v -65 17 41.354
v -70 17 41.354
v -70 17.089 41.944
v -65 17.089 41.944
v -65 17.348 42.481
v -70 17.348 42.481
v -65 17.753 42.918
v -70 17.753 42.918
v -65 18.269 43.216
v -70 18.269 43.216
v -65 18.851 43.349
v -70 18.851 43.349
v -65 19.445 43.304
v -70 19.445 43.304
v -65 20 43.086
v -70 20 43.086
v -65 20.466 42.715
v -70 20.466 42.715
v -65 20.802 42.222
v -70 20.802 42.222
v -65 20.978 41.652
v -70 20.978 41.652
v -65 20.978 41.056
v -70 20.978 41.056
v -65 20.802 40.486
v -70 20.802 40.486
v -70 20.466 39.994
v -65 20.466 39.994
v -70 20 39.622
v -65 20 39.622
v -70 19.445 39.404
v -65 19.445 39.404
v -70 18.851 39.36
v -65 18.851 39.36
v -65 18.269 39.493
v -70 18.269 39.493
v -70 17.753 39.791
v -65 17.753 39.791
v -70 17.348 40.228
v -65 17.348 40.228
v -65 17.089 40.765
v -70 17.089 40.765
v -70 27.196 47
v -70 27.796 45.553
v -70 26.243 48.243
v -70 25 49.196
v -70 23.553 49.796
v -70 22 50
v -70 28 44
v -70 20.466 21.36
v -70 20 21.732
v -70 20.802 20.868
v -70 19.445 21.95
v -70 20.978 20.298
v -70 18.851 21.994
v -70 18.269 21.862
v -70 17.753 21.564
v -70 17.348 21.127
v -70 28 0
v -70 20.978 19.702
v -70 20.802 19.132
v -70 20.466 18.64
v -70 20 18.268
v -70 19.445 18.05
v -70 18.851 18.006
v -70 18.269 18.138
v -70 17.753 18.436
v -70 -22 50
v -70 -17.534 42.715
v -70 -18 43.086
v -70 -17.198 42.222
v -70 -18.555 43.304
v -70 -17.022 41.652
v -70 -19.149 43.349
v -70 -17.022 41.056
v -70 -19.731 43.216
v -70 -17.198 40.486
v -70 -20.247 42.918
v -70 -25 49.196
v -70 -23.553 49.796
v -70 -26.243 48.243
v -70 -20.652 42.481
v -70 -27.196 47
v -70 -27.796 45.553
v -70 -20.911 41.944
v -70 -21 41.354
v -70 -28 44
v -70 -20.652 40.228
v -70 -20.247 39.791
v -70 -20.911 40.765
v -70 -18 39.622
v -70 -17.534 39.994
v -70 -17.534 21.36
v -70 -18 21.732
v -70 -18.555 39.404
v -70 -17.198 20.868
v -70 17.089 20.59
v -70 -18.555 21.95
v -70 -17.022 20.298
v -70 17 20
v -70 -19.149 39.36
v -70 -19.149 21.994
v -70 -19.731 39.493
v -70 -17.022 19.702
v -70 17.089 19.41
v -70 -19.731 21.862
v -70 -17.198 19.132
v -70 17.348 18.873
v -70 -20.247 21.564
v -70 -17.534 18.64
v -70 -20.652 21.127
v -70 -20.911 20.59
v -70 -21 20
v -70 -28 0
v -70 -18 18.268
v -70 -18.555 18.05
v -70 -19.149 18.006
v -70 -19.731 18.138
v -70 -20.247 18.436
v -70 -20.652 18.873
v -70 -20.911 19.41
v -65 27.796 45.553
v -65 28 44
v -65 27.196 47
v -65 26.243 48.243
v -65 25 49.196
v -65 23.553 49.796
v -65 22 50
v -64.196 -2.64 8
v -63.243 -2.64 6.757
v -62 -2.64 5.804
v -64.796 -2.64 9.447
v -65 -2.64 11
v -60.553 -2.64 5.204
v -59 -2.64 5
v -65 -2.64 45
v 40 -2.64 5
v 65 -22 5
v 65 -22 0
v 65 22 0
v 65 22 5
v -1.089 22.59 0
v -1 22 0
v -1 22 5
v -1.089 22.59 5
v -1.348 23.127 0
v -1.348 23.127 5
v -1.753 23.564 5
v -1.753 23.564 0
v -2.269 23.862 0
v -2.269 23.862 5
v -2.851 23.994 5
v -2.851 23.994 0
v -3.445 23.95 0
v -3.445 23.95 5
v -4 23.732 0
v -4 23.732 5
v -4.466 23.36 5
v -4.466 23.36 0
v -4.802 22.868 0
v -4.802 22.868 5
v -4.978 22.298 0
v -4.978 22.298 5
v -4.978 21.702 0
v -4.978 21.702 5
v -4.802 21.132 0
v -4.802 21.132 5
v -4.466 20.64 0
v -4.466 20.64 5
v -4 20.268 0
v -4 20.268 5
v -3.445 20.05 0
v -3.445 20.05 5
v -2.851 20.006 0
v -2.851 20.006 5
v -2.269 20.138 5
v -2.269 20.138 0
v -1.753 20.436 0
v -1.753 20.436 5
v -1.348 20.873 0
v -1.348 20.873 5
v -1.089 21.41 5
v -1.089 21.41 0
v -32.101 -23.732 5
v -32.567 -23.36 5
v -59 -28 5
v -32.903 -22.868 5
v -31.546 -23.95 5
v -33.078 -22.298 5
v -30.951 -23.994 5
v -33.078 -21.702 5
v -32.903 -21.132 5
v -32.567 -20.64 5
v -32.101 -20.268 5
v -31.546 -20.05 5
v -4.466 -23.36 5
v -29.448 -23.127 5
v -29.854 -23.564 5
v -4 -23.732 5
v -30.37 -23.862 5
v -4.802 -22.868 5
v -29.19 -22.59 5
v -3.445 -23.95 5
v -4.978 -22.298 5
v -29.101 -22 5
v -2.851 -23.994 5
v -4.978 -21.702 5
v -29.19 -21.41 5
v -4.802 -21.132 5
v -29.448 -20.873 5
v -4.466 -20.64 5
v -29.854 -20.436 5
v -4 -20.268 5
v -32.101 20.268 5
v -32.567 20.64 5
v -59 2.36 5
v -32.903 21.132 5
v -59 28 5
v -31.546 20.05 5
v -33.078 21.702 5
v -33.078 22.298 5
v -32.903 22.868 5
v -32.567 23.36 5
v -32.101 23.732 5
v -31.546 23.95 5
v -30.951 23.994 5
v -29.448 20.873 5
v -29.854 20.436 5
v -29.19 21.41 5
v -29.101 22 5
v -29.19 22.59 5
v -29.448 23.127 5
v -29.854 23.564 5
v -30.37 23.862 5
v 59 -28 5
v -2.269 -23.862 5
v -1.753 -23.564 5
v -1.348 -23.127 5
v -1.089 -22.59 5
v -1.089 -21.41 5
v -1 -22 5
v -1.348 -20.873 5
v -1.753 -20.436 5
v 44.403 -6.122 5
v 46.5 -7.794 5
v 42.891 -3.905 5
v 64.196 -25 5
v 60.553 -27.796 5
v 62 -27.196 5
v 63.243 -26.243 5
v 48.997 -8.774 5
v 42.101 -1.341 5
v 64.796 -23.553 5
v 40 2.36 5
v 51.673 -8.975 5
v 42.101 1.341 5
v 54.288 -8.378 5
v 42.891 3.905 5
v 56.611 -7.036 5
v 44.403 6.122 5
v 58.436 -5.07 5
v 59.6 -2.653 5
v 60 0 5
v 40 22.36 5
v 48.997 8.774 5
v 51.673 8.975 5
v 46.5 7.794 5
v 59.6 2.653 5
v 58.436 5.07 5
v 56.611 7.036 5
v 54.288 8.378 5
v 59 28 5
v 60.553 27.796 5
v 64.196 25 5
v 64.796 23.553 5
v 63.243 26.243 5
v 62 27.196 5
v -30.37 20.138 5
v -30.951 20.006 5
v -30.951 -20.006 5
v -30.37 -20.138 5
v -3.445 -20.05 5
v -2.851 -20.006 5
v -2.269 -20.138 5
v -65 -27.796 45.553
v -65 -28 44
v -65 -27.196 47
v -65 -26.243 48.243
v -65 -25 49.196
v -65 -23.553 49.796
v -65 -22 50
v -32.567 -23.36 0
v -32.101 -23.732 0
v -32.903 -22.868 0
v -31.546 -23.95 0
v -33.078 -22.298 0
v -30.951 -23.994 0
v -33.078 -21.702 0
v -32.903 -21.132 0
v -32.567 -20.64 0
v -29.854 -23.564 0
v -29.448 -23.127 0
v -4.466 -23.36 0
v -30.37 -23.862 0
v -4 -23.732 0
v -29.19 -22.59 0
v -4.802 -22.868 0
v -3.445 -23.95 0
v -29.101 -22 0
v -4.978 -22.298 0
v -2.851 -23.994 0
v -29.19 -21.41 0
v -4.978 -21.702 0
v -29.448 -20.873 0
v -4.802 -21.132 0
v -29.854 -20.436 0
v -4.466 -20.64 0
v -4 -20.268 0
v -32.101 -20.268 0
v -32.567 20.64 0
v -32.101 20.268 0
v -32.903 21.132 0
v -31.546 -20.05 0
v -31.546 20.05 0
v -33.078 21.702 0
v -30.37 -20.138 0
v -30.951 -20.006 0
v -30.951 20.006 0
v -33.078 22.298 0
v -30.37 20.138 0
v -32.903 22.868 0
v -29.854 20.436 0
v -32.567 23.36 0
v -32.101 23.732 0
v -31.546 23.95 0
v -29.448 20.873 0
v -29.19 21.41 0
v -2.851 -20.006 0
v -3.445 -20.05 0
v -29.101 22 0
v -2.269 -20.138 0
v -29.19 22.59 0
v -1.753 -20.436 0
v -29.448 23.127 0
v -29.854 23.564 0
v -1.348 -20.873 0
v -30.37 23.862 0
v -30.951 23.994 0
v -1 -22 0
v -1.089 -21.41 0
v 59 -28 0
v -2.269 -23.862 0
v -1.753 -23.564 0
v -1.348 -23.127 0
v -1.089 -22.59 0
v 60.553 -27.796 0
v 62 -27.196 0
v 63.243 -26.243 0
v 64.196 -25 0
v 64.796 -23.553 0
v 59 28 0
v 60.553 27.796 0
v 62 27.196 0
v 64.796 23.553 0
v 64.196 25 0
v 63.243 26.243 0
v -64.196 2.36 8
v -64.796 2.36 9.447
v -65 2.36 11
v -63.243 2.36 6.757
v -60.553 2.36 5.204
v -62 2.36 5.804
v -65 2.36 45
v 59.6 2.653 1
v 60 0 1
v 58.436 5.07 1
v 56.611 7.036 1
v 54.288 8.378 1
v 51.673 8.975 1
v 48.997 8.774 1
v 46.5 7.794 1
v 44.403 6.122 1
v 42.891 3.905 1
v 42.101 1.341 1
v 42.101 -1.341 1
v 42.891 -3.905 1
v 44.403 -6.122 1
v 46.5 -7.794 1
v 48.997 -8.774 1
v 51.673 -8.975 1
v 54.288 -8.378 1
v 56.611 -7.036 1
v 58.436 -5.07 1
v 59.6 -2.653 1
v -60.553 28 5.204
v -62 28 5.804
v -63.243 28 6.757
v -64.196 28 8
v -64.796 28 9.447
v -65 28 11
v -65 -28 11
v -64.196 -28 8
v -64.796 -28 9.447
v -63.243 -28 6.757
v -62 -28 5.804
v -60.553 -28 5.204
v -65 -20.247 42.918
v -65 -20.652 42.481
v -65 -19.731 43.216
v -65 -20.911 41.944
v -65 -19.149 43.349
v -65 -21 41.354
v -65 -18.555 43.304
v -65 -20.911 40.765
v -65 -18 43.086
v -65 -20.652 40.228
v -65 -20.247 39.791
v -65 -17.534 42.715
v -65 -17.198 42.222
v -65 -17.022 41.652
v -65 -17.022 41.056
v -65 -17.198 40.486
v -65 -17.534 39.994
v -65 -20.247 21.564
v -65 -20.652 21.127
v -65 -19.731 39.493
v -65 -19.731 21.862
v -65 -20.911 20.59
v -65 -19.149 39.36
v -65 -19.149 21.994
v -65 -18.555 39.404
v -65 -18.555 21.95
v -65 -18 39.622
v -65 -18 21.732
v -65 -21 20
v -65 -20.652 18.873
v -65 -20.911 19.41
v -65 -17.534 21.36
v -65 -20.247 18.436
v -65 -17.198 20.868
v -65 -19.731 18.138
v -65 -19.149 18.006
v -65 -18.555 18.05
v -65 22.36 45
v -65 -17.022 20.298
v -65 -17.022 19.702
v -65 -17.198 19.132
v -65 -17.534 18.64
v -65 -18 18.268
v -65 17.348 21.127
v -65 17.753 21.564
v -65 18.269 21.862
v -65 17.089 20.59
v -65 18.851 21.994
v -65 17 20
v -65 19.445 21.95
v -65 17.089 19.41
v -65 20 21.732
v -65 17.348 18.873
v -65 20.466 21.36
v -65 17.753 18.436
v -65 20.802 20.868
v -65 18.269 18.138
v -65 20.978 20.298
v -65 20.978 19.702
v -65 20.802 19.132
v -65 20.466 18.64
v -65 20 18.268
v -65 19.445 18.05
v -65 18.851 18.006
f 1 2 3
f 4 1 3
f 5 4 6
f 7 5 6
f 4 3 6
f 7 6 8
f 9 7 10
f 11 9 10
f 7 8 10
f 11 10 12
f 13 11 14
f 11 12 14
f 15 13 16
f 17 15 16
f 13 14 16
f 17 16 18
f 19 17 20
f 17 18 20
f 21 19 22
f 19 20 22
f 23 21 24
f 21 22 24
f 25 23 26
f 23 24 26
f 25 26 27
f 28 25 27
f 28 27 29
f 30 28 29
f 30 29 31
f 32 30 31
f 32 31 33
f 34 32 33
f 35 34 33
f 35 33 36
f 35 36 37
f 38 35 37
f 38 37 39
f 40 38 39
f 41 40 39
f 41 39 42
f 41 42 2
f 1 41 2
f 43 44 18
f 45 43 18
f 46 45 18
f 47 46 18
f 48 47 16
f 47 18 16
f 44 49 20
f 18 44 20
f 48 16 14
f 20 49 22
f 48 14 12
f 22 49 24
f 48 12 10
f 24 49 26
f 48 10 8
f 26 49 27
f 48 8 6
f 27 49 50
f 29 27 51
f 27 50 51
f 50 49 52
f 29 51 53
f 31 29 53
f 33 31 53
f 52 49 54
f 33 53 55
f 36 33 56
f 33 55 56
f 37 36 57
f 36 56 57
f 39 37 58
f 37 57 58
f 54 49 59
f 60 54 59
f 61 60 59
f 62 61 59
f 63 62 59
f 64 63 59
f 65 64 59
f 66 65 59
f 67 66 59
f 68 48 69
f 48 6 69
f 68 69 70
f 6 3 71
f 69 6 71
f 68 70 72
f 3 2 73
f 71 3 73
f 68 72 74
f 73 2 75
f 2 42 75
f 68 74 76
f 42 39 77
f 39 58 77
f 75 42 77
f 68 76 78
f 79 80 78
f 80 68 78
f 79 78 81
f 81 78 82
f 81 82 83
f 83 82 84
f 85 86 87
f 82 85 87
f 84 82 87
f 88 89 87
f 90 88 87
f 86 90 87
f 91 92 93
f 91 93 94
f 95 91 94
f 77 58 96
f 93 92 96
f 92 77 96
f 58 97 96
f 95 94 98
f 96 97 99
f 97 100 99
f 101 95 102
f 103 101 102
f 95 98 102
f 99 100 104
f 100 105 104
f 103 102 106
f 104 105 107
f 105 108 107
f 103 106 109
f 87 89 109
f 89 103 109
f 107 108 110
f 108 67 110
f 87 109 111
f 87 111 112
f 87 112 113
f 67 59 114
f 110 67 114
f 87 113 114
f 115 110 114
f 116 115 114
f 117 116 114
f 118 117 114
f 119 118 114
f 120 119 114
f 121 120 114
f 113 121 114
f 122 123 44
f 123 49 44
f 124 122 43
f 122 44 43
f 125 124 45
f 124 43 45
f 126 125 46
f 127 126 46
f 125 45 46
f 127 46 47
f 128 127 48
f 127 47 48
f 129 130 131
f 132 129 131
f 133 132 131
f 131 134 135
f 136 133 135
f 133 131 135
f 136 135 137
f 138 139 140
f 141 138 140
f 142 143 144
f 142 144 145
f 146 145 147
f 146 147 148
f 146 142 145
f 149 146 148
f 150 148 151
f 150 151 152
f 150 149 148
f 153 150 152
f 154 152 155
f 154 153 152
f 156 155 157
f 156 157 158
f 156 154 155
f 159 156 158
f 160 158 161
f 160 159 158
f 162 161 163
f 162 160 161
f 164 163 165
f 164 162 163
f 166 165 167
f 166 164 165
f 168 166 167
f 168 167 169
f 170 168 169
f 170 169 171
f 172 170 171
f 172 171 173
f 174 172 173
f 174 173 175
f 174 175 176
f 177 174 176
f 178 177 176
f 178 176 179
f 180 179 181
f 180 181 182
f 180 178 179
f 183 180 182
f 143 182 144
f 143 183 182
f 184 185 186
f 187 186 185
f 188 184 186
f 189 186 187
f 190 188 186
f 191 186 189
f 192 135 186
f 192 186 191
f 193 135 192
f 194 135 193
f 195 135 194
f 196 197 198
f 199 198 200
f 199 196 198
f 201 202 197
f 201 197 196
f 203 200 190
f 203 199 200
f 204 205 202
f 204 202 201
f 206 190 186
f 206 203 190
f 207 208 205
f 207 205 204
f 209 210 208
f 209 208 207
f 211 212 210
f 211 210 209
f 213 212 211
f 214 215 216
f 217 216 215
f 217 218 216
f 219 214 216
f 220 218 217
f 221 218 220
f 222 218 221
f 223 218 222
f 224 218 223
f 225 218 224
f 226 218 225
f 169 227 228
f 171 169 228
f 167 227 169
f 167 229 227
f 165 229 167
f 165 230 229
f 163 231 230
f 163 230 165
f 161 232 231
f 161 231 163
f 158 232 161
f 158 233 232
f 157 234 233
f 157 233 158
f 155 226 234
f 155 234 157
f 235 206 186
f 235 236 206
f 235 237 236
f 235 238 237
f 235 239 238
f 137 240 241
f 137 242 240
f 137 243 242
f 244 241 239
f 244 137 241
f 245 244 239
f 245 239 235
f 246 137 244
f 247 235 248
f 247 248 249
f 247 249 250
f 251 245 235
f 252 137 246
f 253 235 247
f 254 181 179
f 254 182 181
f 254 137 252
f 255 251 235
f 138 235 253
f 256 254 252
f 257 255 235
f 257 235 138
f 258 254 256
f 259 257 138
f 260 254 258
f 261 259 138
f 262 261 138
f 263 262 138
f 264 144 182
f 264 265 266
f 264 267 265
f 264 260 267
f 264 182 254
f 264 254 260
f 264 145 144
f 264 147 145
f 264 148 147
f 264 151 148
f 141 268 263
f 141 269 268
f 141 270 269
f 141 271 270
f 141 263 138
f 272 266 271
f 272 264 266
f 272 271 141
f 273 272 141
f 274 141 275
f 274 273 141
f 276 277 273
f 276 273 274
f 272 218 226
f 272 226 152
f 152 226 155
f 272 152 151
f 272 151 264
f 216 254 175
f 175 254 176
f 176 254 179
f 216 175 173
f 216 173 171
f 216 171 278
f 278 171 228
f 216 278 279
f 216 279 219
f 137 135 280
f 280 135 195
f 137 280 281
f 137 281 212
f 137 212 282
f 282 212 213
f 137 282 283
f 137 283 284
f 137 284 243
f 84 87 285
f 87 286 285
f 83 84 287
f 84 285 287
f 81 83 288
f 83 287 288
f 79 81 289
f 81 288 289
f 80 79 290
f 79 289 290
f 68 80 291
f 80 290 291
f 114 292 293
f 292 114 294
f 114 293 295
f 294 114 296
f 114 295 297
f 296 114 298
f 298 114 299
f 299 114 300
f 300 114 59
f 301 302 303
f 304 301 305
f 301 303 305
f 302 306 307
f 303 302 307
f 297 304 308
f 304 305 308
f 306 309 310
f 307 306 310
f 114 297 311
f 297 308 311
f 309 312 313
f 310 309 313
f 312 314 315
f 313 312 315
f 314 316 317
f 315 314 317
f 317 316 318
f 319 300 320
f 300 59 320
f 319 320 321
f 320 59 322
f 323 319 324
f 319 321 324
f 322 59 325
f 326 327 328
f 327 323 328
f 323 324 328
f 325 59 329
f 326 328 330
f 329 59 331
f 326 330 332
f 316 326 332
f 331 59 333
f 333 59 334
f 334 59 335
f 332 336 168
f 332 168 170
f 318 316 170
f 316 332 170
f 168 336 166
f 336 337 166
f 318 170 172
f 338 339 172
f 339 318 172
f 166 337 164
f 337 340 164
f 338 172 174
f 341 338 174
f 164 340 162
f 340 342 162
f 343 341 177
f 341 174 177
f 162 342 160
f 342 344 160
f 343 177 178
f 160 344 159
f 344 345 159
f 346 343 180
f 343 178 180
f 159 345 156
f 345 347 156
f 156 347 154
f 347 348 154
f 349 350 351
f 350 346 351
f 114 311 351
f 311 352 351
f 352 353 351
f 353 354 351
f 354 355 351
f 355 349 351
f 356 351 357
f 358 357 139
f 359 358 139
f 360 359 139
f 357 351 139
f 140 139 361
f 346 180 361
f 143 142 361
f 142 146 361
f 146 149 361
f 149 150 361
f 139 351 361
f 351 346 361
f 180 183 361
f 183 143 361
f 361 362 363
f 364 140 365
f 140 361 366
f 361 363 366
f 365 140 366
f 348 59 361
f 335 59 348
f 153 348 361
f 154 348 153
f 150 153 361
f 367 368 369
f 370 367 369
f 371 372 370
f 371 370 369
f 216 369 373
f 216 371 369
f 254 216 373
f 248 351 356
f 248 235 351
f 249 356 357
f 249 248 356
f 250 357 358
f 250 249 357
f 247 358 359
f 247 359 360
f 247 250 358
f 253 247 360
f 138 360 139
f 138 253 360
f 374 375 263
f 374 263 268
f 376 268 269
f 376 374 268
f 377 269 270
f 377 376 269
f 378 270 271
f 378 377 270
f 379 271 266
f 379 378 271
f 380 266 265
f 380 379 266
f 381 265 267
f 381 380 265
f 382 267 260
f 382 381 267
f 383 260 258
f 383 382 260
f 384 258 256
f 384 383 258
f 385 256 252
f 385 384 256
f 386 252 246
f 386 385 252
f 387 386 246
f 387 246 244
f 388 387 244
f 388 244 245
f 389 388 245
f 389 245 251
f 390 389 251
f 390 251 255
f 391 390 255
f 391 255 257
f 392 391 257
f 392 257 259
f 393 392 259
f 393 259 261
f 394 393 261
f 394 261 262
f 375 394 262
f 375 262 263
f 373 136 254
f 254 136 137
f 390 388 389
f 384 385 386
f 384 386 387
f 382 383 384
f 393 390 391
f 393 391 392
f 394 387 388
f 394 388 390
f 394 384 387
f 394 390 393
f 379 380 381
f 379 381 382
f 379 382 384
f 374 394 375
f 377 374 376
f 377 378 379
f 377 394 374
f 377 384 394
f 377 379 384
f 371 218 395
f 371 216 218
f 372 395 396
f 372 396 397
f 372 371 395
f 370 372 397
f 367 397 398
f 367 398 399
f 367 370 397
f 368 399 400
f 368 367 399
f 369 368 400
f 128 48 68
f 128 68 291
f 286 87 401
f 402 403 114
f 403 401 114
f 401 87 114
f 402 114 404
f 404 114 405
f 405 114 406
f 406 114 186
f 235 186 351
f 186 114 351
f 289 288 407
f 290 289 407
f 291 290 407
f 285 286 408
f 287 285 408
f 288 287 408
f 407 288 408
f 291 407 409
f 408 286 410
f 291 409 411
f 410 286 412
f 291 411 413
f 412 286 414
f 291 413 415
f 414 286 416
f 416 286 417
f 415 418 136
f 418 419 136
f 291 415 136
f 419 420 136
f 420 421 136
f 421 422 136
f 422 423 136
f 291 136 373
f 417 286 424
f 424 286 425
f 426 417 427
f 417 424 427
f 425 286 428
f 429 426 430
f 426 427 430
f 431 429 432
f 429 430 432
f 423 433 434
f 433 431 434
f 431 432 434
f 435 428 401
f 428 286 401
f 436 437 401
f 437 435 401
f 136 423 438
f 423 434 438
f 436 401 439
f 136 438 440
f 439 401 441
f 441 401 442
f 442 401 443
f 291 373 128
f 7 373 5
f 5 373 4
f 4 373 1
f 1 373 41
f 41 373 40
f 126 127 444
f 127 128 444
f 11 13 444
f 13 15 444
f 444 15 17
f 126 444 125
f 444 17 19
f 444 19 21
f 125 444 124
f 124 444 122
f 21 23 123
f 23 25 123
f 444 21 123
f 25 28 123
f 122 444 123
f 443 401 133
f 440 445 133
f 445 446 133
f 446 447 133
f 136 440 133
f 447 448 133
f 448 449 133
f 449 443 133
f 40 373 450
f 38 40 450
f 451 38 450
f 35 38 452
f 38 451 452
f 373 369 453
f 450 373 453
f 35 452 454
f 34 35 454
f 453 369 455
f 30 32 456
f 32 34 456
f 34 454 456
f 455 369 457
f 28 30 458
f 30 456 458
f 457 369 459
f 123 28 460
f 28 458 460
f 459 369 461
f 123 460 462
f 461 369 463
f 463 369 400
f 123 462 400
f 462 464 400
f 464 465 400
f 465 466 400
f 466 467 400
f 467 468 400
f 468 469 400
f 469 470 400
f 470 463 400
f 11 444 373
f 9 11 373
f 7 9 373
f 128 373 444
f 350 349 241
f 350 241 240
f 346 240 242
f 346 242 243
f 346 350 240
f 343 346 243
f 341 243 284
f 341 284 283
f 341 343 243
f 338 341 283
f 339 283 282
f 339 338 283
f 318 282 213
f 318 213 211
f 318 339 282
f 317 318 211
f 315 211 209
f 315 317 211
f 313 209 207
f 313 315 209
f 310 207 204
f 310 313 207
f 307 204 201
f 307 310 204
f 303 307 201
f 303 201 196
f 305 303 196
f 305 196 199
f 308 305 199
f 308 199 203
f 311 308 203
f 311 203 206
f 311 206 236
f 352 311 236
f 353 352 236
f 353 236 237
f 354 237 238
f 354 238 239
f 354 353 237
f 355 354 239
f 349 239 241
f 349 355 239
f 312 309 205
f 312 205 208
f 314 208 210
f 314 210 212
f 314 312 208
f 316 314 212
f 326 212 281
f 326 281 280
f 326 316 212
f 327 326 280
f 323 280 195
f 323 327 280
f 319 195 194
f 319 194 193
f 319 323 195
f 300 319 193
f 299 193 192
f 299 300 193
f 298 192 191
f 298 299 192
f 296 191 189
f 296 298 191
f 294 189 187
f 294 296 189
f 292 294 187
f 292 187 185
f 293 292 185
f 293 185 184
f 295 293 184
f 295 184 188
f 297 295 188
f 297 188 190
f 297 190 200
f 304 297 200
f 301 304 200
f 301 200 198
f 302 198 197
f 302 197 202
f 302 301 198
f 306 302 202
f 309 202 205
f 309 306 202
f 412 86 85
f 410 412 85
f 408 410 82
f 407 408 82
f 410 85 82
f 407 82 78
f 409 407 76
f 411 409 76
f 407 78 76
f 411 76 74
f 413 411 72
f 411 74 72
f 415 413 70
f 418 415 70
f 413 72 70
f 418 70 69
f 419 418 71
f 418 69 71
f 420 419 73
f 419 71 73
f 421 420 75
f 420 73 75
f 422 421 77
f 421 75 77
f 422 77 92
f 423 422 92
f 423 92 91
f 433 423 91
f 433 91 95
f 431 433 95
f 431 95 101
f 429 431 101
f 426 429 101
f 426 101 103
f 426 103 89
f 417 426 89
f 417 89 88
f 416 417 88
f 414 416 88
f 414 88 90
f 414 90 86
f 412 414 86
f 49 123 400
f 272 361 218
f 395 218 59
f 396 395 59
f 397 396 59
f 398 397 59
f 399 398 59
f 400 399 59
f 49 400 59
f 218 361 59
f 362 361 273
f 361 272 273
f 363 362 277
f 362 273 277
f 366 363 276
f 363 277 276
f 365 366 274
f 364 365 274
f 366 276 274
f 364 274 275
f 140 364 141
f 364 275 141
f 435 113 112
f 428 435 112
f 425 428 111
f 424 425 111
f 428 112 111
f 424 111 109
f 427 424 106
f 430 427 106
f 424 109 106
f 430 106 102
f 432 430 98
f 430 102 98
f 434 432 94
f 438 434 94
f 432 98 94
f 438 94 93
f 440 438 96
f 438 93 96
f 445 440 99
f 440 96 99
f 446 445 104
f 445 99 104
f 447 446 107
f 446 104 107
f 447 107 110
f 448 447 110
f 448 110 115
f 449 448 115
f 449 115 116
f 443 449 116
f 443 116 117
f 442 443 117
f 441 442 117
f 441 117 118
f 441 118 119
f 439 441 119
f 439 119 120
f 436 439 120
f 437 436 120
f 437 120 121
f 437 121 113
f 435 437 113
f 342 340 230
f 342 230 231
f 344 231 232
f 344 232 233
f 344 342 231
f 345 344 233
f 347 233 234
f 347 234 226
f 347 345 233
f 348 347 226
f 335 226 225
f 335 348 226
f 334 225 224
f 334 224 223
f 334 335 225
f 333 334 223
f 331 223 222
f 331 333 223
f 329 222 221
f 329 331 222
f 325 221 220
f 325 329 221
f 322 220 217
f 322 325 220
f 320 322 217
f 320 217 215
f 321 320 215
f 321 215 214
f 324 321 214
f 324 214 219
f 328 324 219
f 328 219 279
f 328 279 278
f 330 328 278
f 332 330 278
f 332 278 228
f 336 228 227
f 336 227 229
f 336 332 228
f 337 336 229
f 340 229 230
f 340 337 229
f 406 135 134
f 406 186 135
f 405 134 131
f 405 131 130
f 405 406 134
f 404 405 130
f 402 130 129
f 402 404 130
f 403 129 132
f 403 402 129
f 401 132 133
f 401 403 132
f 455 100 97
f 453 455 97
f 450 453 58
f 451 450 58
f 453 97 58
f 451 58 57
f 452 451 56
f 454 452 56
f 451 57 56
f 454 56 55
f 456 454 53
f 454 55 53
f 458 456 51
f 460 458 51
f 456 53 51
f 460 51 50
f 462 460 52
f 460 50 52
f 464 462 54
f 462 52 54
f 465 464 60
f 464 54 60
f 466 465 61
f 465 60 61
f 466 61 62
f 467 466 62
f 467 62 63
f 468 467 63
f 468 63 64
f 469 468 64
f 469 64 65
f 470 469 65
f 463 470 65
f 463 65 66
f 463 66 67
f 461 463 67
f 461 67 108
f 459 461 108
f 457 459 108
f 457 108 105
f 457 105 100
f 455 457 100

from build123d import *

# Parameters (mm, degrees)
F1_DEPTH = 50
F0_R     = 2
F0_R_2   = 9
F2_DEPTH = 5
F3_R     = 6
F4_DEPTH = 1
F0_W     = 105
F0_H     = 5
F5_DEPTH = 45
F7_DEPTH = 25
F8_R     = 2
F9_DEPTH = 25


with BuildPart() as f1:
    # F0 (on Top) → F1 (new body)
    with BuildSketch(Plane.XY):
        Polygon((-70, -28), (-65, -28), (-65, -2.640025), (-65, 2.359975), (-65, 28), (-70, 28), align=None)
    extrude(amount=F1_DEPTH)

    # F0 (on Top) → F2 (join)
    with BuildSketch(Plane.XY):
        Polygon((-65, -28), (65, -28), (65, 28), (-65, 28), (-65, 2.359975), (40, 2.359975), (40, -2.640025), (-65, -2.640025), align=None)
        with Locations((-31.100778, -22)):
            Circle(F0_R, mode=Mode.SUBTRACT)
        with Locations((-3, -22)):
            Circle(F0_R, mode=Mode.SUBTRACT)
        with Locations((-31.100778, 22)):
            Circle(F0_R, mode=Mode.SUBTRACT)
        with Locations((-3, 22)):
            Circle(F0_R, mode=Mode.SUBTRACT)
        with Locations((51, 0)):
            Circle(F0_R_2, mode=Mode.SUBTRACT)
    extrude(amount=F2_DEPTH)

    # F3
    f3_edges = [f1.edges().sort_by_distance(p)[0] for p in [
        (-67.5, 28, 50),
        (-67.5, -28, 50),
        (65, -28, 2.5),
        (65, 28, 2.5),
        (-65, -15.320012, 5),
        (-65, 15.179988, 5),
    ]]
    fillet(f3_edges, radius=F3_R)

    # F0 (on Top) → F4 (join)
    with BuildSketch(Plane.XY):
        with Locations((51, 0)):
            Circle(F0_R_2)
    extrude(amount=F4_DEPTH)

    # F0 (on Top) → F5 (join)
    with BuildSketch(Plane.XY):
        with Locations((-12.5, -0.140025)):
            Rectangle(F0_W, F0_H)
    extrude(amount=F5_DEPTH)

    # F6 (on face) → F7 (cut)
    with BuildSketch(Plane.XZ.offset(2.640025)):
        Polygon((40, 45), (-65, 45), (40, 5), align=None)
    extrude(amount=-F7_DEPTH, mode=Mode.SUBTRACT)

    # F8 (on face) → F9 (cut)
    with BuildSketch(Plane(origin=(-70, 0, 0), x_dir=(0, -1, 0), z_dir=(-1, 0, 0))):
        with Locations((-19, 41.354249)):
            Circle(F8_R)
        with Locations((-19, 20)):
            Circle(F8_R)
        with Locations((19, 41.354249)):
            Circle(F8_R)
        with Locations((19, 20)):
            Circle(F8_R)
    extrude(amount=-F9_DEPTH, mode=Mode.SUBTRACT)


solid = f1.part
